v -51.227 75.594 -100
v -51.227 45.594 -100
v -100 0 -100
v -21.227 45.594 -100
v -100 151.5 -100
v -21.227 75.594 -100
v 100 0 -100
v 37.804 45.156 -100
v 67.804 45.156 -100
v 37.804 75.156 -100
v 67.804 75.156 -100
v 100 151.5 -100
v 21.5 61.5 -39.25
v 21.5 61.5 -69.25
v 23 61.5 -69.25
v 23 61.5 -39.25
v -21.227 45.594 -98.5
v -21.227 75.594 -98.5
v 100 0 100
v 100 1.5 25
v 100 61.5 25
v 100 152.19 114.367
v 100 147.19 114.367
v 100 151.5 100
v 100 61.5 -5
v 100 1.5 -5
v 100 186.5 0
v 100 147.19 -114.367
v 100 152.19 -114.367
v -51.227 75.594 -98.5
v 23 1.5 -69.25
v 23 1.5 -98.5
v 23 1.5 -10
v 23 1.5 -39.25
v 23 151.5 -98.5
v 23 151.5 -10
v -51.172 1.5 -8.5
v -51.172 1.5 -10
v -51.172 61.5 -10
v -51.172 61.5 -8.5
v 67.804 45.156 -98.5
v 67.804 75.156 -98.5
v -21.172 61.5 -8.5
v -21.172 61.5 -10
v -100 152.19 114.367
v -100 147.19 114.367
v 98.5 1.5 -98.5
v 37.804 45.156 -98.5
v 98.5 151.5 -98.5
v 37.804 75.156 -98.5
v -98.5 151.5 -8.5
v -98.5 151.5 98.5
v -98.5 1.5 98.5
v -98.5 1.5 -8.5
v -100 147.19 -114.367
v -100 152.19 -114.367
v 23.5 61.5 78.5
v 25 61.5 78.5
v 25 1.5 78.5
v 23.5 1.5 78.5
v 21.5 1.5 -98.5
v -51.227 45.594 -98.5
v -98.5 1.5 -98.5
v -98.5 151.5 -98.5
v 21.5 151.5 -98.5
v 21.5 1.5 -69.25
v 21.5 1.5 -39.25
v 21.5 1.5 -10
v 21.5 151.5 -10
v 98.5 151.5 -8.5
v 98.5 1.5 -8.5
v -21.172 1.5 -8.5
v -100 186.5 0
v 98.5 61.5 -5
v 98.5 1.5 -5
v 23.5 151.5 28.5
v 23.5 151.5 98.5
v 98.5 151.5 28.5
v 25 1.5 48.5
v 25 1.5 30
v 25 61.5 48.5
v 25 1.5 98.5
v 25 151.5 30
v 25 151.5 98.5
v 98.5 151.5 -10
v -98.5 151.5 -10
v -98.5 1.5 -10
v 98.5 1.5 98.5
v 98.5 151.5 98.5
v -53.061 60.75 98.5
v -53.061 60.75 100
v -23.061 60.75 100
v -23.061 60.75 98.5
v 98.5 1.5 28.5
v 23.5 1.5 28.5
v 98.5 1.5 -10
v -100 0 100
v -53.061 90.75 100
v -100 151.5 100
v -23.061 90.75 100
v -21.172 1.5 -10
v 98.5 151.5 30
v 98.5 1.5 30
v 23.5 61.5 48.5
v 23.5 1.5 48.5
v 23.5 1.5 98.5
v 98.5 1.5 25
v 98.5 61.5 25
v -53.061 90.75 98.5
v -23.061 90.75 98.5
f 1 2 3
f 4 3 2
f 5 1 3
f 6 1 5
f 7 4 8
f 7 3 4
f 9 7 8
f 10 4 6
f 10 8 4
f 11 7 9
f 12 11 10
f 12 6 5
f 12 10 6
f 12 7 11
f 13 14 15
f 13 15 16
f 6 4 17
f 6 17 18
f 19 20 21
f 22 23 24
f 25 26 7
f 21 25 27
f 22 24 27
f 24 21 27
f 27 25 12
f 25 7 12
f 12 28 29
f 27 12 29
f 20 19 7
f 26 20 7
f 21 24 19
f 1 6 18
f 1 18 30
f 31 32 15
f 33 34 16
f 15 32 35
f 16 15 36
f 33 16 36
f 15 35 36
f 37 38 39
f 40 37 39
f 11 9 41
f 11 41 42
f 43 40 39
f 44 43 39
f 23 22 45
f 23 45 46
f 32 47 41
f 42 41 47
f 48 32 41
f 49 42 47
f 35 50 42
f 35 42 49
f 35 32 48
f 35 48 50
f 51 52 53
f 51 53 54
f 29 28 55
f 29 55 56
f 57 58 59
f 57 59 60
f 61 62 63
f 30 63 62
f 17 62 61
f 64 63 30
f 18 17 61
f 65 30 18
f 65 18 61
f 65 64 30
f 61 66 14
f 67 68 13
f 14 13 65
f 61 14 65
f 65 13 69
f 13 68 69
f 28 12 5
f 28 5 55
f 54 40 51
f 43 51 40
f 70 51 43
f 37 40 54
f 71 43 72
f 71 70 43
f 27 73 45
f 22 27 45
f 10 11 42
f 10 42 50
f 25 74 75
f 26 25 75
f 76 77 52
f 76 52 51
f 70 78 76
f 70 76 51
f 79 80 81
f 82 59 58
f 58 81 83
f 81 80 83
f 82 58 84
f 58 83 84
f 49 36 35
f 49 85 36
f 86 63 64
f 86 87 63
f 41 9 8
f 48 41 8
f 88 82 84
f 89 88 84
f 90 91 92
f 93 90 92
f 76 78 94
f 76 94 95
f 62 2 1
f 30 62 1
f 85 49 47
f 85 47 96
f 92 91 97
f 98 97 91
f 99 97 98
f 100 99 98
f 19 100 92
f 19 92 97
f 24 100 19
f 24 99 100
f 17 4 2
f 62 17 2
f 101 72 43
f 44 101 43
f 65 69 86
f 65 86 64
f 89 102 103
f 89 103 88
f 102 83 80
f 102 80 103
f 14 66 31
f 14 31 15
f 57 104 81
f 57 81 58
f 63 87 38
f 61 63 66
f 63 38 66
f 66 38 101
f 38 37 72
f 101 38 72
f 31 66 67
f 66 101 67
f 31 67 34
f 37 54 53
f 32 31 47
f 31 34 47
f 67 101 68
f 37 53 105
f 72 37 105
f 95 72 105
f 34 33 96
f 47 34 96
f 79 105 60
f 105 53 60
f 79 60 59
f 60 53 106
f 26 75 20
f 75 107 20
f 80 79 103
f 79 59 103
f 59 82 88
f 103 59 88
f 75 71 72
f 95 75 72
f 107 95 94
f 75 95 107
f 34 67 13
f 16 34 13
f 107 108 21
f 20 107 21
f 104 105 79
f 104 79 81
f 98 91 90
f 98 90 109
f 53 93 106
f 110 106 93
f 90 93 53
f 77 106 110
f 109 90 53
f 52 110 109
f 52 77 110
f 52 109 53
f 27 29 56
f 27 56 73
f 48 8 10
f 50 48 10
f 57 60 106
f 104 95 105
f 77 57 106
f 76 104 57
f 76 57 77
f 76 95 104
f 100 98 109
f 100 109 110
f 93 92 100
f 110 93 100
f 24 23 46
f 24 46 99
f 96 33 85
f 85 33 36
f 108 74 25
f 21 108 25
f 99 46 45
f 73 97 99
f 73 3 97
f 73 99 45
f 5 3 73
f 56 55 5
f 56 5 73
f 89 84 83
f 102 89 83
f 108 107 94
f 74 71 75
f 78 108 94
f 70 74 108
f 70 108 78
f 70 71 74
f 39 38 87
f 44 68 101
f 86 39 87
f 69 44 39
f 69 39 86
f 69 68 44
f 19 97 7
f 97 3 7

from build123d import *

# Parameters (mm, degrees)
SKETCH_1_W           = 150
SKETCH_1_H           = 3.5
EXTRUDE_1_DEPTH      = 1.5
SKETCH_2_W           = 121.171669679
SKETCH_2_H           = 150
EXTRUDE_2_DEPTH      = 91.5
SKETCH_3_W           = 1.5
SKETCH_3_H           = 90
EXTRUDE_3_DEPTH      = 30
EXTRUDE_4_DEPTH      = 30
SKETCH_5_W           = 151.171669679
SKETCH_5_H           = 125
EXTRUDE_5_DEPTH      = 1.5
SKETCH_6_W           = 125
SKETCH_6_H           = 151.5
EXTRUDE_6_DEPTH      = 48.828330321
SKETCH_7_W           = 200
SKETCH_7_H           = 151.5
EXTRUDE_7_DEPTH      = 75
SKETCH_8_W           = 74.671669679
SKETCH_8_H           = 150
CUT_EXTRUDE_1_DEPTH  = 53.5
SKETCH_9_W           = 30
SKETCH_9_H           = 150
CUT_EXTRUDE_2_DEPTH  = 59.25
SKETCH_10_W          = 59.25
SKETCH_10_H          = 150
CUT_EXTRUDE_3_DEPTH  = 42.671669679
SKETCH_11_W          = 30
SKETCH_11_H          = 60
CUT_EXTRUDE_4_DEPTH  = 1.5
SKETCH_12_W          = 30
SKETCH_12_H          = 60
CUT_EXTRUDE_5_DEPTH  = 1.5
SKETCH_13_W          = 87
SKETCH_13_H          = 150
CUT_EXTRUDE_6_DEPTH  = 47.328330321
SKETCH_14_W          = 59.25
SKETCH_14_H          = 150
CUT_EXTRUDE_7_DEPTH  = 47.328330321
SKETCH_15_W          = 120
SKETCH_15_H          = 150
CUT_EXTRUDE_8_DEPTH  = 29.25
SKETCH_16_W          = 88.5
SKETCH_16_H          = 150
CUT_EXTRUDE_9_DEPTH  = 75.5
SKETCH_17_W          = 122
SKETCH_17_H          = 150
CUT_EXTRUDE_10_DEPTH = 20
SKETCH_18_W          = 50
SKETCH_18_H          = 150
CUT_EXTRUDE_11_DEPTH = 73.5
SKETCH_19_W          = 73.5
SKETCH_19_H          = 150
CUT_EXTRUDE_12_DEPTH = 18.5
SKETCH_20_W          = 75
SKETCH_20_H          = 150
CUT_EXTRUDE_13_DEPTH = 3.5
CUT_EXTRUDE_14_REACH = 272.097
SKETCH_21_W          = 30
SKETCH_21_H          = 30
CUT_EXTRUDE_15_REACH = 272.097
SKETCH_22_W          = 30
SKETCH_22_H          = 30
CUT_EXTRUDE_16_REACH = 272.097
SKETCH_23_W          = 30
SKETCH_23_H          = 30
EXTRUDE_11_DEPTH     = 200
EXTRUDE_12_DEPTH     = 200


with BuildPart() as part:
    # 草圖1 → 填料-伸長1 (new body)
    with BuildSketch(Plane(origin=(98.5, 0, 0), x_dir=(0, -1, 0), z_dir=(-1, 0, 0))):
        with Locations((-76.5, -6.75)):
            Rectangle(SKETCH_1_W, SKETCH_1_H)
    extrude(amount=-EXTRUDE_1_DEPTH)

    # 草圖2 → 填料-伸長2 (add)
    with BuildSketch(Plane(origin=(0, 0, -8.5), x_dir=(-1, 0, 0), z_dir=(0, 0, -1))):
        with Locations((-39.41416516, 76.5)):
            Rectangle(SKETCH_2_W, SKETCH_2_H)
    extrude(amount=EXTRUDE_2_DEPTH)

    # 草圖3 → 填料-伸長3 (add)
    with BuildSketch(Plane.XY.offset(-5)):
        with Locations((99.25, 106.5)):
            Rectangle(SKETCH_3_W, SKETCH_3_H)
    extrude(amount=EXTRUDE_3_DEPTH)

    # 草圖4 → 填料-伸長4 (add)
    with BuildSketch(Plane.ZY.offset(21.171669679)):
        Polygon((-100, 1.5), (-100, 151.5), (-8.5, 151.5), (-8.5, 61.5), (-10, 61.5), (-10, 1.5), align=None)
    extrude(amount=EXTRUDE_4_DEPTH)

    # 草圖5 → 填料-伸長5 (add)
    with BuildSketch(Plane.XZ.offset(-1.5)):
        with Locations((24.41416516, -37.5)):
            Rectangle(SKETCH_5_W, SKETCH_5_H)
    extrude(amount=EXTRUDE_5_DEPTH)

    # 草圖6 → 填料-伸長6 (add)
    with BuildSketch(Plane.ZY.offset(51.171669679)):
        with Locations((-37.5, 75.75)):
            Rectangle(SKETCH_6_W, SKETCH_6_H)
    extrude(amount=EXTRUDE_6_DEPTH)

    # 草圖7 → 填料-伸長7 (add)
    with BuildSketch(Plane.XY.offset(25)):
        with Locations((0, 75.75)):
            Rectangle(SKETCH_7_W, SKETCH_7_H)
    extrude(amount=EXTRUDE_7_DEPTH)

    # 草圖8 → 除料-伸長1 (cut)
    with BuildSketch(Plane(origin=(0, 0, 25), x_dir=(-1, 0, 0), z_dir=(0, 0, -1))):
        with Locations((13.83583484, 76.5)):
            Rectangle(SKETCH_8_W, SKETCH_8_H)
    extrude(amount=-CUT_EXTRUDE_1_DEPTH, mode=Mode.SUBTRACT)

    # 草圖9 → 除料-伸長2 (cut)
    with BuildSketch(Plane.XY.offset(-10)):
        with Locations((-36.171669679, 76.5)):
            Rectangle(SKETCH_9_W, SKETCH_9_H)
    extrude(amount=-CUT_EXTRUDE_2_DEPTH, mode=Mode.SUBTRACT)

    # 草圖10 → 除料-伸長3 (cut)
    with BuildSketch(Plane.ZY.offset(21.171669679)):
        with Locations((-39.625, 76.5)):
            Rectangle(SKETCH_10_W, SKETCH_10_H)
    extrude(amount=-CUT_EXTRUDE_3_DEPTH, mode=Mode.SUBTRACT)

    # 草圖11 → 除料-伸長4 (cut)
    with BuildSketch(Plane.ZY.offset(-23.5)):
        with Locations((63.5, 31.5)):
            Rectangle(SKETCH_11_W, SKETCH_11_H)
    extrude(amount=-CUT_EXTRUDE_4_DEPTH, mode=Mode.SUBTRACT)

    # 草圖12 → 除料-伸長5 (cut)
    with BuildSketch(Plane.ZY.offset(-21.5)):
        with Locations((-54.25, 31.5)):
            Rectangle(SKETCH_12_W, SKETCH_12_H)
    extrude(amount=-CUT_EXTRUDE_5_DEPTH, mode=Mode.SUBTRACT)

    # 草圖13 → 除料-伸長6 (cut)
    with BuildSketch(Plane(origin=(-51.171669679, 0, 0), x_dir=(0, 0, -1), z_dir=(1, 0, 0))):
        with Locations((-35, 76.5)):
            Rectangle(SKETCH_13_W, SKETCH_13_H)
    extrude(amount=-CUT_EXTRUDE_6_DEPTH, mode=Mode.SUBTRACT)

    # 草圖14 → 除料-伸長7 (cut)
    with BuildSketch(Plane(origin=(-51.171669679, 0, 0), x_dir=(0, 0, -1), z_dir=(1, 0, 0))):
        with Locations((39.625, 76.5)):
            Rectangle(SKETCH_14_W, SKETCH_14_H)
    extrude(amount=-CUT_EXTRUDE_7_DEPTH, mode=Mode.SUBTRACT)

    # 草圖15 → 除料-伸長8 (cut)
    with BuildSketch(Plane.XY.offset(-69.25)):
        with Locations((-38.5, 76.5)):
            Rectangle(SKETCH_15_W, SKETCH_15_H)
    extrude(amount=-CUT_EXTRUDE_8_DEPTH, mode=Mode.SUBTRACT)

    # 草圖16 → 除料-伸長9 (cut)
    with BuildSketch(Plane.ZY.offset(-23)):
        with Locations((-54.25, 76.5)):
            Rectangle(SKETCH_16_W, SKETCH_16_H)
    extrude(amount=-CUT_EXTRUDE_9_DEPTH, mode=Mode.SUBTRACT)

    # 草圖17 → 除料-伸長10 (cut)
    with BuildSketch(Plane(origin=(0, 0, 78.5), x_dir=(-1, 0, 0), z_dir=(0, 0, -1))):
        with Locations((37.5, 76.5)):
            Rectangle(SKETCH_17_W, SKETCH_17_H)
    extrude(amount=-CUT_EXTRUDE_10_DEPTH, mode=Mode.SUBTRACT)

    # 草圖18 → 除料-伸長11 (cut)
    with BuildSketch(Plane.ZY.offset(-25)):
        with Locations((73.5, 76.5)):
            Rectangle(SKETCH_18_W, SKETCH_18_H)
    extrude(amount=-CUT_EXTRUDE_11_DEPTH, mode=Mode.SUBTRACT)

    # 草圖19 → 除料-伸長12 (cut)
    with BuildSketch(Plane.XY.offset(48.5)):
        with Locations((61.75, 76.5)):
            Rectangle(SKETCH_19_W, SKETCH_19_H)
    extrude(amount=-CUT_EXTRUDE_12_DEPTH, mode=Mode.SUBTRACT)

    # 草圖20 → 除料-伸長13 (cut)
    with BuildSketch(Plane(origin=(0, 0, 25), x_dir=(-1, 0, 0), z_dir=(0, 0, -1))):
        with Locations((-61, 76.5)):
            Rectangle(SKETCH_20_W, SKETCH_20_H)
    extrude(amount=-CUT_EXTRUDE_13_DEPTH, mode=Mode.SUBTRACT)

    # 草圖21 → 除料-伸長14 (cut, up to next)
    with BuildSketch(Plane(origin=(0, 0, -100), x_dir=(-1, 0, 0), z_dir=(0, 0, -1)), mode=Mode.PRIVATE) as cut_extrude_14_sk1:
        with Locations((-52.804007689, 60.155834385)):
            Rectangle(SKETCH_21_W, SKETCH_21_H)
    cut_extrude_14_tool1 = extrude(cut_extrude_14_sk1.sketch, amount=-CUT_EXTRUDE_14_REACH, mode=Mode.PRIVATE) & part.part
    add(cut_extrude_14_tool1.solids().sort_by_distance((52.804008, 60.155834, -100))[0], mode=Mode.SUBTRACT)

    # 草圖22 → 除料-伸長15 (cut, up to next)
    with BuildSketch(Plane(origin=(0, 0, -100), x_dir=(-1, 0, 0), z_dir=(0, 0, -1)), mode=Mode.PRIVATE) as cut_extrude_15_sk1:
        with Locations((36.226594007, 60.594472186)):
            Rectangle(SKETCH_22_W, SKETCH_22_H)
    cut_extrude_15_tool1 = extrude(cut_extrude_15_sk1.sketch, amount=-CUT_EXTRUDE_15_REACH, mode=Mode.PRIVATE) & part.part
    add(cut_extrude_15_tool1.solids().sort_by_distance((-36.226594, 60.594472, -100))[0], mode=Mode.SUBTRACT)

    # 草圖23 → 除料-伸長16 (cut, up to next)
    with BuildSketch(Plane.XY.offset(100), mode=Mode.PRIVATE) as cut_extrude_16_sk1:
        with Locations((-38.061358281, 75.75)):
            Rectangle(SKETCH_23_W, SKETCH_23_H)
    cut_extrude_16_tool1 = extrude(cut_extrude_16_sk1.sketch, amount=-CUT_EXTRUDE_16_REACH, mode=Mode.PRIVATE) & part.part
    add(cut_extrude_16_tool1.solids().sort_by_distance((-38.061358, 75.75, 100))[0], mode=Mode.SUBTRACT)



with BuildPart() as body_2:
    # 草圖26 → 填料-伸長11 (new body)
    with BuildSketch(Plane(origin=(100, 0, 0), x_dir=(0, 0, -1), z_dir=(1, 0, 0))):
        Polygon((-100, 151.5), (0, 181.5), (100, 151.5), (114.367394278, 147.189781717), (114.367394278, 152.189781717), (0, 186.5), (-114.367394278, 152.189781717), (-114.367394278, 147.189781717), align=None)
    extrude(amount=-EXTRUDE_11_DEPTH)


with BuildPart() as part_1:
    add(part.part)

    add(body_2.part)  # 填料-伸長12 merges body 2
    # 草圖27 → 填料-伸長12 (add)
    with BuildSketch(Plane(origin=(100, 0, 0), x_dir=(0, 0, -1), z_dir=(1, 0, 0))):
        Polygon((0, 181.5), (-100, 151.5), (0, 151.5), (100, 151.5), align=None)
    extrude(amount=-EXTRUDE_12_DEPTH)


solid = part_1.part
